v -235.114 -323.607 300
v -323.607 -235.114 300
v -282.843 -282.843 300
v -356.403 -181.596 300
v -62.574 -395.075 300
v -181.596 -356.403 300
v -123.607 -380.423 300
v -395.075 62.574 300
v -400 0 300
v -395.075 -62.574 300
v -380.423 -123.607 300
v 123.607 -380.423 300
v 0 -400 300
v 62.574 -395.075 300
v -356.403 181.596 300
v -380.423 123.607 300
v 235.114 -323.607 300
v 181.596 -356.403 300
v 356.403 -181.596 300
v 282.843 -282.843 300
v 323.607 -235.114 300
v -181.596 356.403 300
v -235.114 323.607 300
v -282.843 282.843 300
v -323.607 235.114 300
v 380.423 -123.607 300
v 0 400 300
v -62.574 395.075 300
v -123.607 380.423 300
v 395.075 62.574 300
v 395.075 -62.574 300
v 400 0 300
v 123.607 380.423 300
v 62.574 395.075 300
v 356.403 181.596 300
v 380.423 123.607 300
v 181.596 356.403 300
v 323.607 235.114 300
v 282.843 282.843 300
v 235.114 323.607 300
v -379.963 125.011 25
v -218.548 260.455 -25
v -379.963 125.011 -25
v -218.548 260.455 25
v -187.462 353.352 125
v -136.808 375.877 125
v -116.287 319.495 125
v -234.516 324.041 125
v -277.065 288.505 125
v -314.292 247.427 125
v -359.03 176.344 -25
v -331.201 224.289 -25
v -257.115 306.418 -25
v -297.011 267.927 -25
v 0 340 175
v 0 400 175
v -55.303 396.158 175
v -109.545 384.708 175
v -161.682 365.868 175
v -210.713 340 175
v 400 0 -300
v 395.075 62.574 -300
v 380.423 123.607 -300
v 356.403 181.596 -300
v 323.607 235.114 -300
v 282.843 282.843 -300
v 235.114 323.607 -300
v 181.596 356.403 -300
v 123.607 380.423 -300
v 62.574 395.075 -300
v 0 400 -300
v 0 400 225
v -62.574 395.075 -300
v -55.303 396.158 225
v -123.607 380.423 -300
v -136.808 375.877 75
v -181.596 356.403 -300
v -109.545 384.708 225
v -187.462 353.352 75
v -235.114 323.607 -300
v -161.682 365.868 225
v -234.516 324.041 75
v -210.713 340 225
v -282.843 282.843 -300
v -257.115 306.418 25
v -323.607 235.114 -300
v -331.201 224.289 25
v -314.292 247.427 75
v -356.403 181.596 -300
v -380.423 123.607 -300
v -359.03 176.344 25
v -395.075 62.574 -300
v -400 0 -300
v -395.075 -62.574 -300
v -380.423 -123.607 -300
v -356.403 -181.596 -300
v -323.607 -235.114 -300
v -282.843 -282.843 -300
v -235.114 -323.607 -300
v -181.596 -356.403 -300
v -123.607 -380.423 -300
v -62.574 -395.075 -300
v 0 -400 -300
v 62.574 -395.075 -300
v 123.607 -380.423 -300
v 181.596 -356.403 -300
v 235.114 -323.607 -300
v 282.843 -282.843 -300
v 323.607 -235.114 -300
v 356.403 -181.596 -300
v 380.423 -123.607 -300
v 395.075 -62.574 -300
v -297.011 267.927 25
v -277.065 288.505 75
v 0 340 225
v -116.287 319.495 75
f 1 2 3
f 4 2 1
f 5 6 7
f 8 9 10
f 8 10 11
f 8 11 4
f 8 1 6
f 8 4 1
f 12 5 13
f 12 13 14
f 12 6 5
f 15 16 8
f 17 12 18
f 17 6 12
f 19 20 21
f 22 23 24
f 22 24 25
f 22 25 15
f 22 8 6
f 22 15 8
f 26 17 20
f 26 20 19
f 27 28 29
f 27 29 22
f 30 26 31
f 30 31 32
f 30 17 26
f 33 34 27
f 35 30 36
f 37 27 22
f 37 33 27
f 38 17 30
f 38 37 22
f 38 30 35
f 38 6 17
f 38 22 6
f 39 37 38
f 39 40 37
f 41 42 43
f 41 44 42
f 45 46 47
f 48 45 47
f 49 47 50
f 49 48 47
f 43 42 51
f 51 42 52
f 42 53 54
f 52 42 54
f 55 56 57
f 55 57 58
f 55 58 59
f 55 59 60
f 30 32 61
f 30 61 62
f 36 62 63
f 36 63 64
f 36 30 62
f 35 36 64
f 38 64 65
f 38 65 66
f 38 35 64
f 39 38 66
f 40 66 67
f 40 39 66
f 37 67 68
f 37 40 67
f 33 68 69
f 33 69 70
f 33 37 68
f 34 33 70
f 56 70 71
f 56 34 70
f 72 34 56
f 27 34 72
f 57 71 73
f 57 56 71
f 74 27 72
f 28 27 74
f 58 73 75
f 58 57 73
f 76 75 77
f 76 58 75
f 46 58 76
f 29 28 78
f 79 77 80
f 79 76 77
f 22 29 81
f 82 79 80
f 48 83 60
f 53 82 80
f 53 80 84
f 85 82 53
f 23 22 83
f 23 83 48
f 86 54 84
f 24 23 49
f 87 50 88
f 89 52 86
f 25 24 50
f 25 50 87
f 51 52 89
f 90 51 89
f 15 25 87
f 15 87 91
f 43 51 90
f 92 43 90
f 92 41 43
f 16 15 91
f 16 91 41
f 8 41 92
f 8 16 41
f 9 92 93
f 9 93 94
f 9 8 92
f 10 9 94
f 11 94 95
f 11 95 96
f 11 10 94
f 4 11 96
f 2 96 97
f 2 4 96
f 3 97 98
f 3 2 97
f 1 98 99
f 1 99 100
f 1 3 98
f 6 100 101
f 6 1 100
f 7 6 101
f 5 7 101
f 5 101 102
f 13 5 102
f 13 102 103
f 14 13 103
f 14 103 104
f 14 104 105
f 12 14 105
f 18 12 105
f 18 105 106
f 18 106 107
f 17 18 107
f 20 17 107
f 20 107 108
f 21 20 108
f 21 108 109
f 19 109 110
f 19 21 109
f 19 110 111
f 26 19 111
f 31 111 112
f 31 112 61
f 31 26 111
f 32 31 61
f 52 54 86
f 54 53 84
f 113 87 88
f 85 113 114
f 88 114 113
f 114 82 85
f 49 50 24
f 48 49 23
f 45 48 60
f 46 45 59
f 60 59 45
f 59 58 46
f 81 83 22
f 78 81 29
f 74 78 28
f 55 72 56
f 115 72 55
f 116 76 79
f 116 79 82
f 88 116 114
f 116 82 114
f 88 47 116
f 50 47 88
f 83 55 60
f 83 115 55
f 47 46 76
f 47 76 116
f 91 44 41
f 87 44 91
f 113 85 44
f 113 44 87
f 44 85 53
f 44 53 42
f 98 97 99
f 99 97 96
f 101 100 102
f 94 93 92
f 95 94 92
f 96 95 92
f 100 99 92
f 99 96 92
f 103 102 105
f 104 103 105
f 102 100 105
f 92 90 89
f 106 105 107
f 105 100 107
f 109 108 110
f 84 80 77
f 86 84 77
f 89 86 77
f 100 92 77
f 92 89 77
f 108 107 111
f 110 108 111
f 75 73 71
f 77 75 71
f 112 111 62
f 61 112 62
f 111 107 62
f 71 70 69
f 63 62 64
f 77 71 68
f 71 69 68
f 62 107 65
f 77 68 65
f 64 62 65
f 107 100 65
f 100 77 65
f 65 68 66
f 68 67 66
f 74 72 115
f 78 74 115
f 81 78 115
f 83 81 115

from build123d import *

# Parameters (mm, degrees)
SKIZZE1_R                       = 400
AUFSATZ_LINEAR_AUSTRAGEN1_DEPTH = 300
SCHNITT_LINEAR_AUSTRAGEN1_DEPTH = 25
SCHNITT_LINEAR_AUSTRAGEN2_DEPTH = 25
SCHNITT_LINEAR_AUSTRAGEN3_DEPTH = 25


with BuildPart() as part:
    # Skizze1 → Aufsatz-Linear austragen1 (new body, symmetric)
    with BuildSketch(Plane.XY):
        Circle(SKIZZE1_R)
    extrude(amount=AUFSATZ_LINEAR_AUSTRAGEN1_DEPTH, both=True)

    # Skizze2 → Schnitt-Linear austragen1 (cut, symmetric)
    with BuildSketch(Plane.XY.offset(200)):
        with BuildLine():
            Line((0, 400), (0, 340))
            Line((0, 340), (-210.713075057, 340))
            ThreePointArc((-210.713075057, 340), (-109.544511501, 384.707681233), (0, 400))
        make_face()
    extrude(amount=SCHNITT_LINEAR_AUSTRAGEN1_DEPTH, both=True, mode=Mode.SUBTRACT)

    # Skizze3 → Schnitt-Linear austragen2 (cut, symmetric)
    with BuildSketch(Plane.XY.offset(100)):
        with BuildLine():
            Line((-136.80805733, 375.877048314), (-116.286848731, 319.495491067))
            Line((-116.286848731, 319.495491067), (-314.292370465, 247.427374936))
            ThreePointArc((-314.292370465, 247.427374936), (-234.515945379, 324.040539691), (-136.80805733, 375.877048314))
        make_face()
    extrude(amount=SCHNITT_LINEAR_AUSTRAGEN2_DEPTH, both=True, mode=Mode.SUBTRACT)

    # Skizze4 → Schnitt-Linear austragen3 (cut, symmetric)
    with BuildSketch(Plane.XY):
        with BuildLine():
            Line((-257.115043875, 306.417777248), (-218.547787293, 260.45511066))
            Line((-218.547787293, 260.45511066), (-379.963367533, 125.011356815))
            ThreePointArc((-379.963367533, 125.011356815), (-331.201295158, 224.289326732), (-257.115043875, 306.417777248))
        make_face()
    extrude(amount=SCHNITT_LINEAR_AUSTRAGEN3_DEPTH, both=True, mode=Mode.SUBTRACT)


solid = part.part
